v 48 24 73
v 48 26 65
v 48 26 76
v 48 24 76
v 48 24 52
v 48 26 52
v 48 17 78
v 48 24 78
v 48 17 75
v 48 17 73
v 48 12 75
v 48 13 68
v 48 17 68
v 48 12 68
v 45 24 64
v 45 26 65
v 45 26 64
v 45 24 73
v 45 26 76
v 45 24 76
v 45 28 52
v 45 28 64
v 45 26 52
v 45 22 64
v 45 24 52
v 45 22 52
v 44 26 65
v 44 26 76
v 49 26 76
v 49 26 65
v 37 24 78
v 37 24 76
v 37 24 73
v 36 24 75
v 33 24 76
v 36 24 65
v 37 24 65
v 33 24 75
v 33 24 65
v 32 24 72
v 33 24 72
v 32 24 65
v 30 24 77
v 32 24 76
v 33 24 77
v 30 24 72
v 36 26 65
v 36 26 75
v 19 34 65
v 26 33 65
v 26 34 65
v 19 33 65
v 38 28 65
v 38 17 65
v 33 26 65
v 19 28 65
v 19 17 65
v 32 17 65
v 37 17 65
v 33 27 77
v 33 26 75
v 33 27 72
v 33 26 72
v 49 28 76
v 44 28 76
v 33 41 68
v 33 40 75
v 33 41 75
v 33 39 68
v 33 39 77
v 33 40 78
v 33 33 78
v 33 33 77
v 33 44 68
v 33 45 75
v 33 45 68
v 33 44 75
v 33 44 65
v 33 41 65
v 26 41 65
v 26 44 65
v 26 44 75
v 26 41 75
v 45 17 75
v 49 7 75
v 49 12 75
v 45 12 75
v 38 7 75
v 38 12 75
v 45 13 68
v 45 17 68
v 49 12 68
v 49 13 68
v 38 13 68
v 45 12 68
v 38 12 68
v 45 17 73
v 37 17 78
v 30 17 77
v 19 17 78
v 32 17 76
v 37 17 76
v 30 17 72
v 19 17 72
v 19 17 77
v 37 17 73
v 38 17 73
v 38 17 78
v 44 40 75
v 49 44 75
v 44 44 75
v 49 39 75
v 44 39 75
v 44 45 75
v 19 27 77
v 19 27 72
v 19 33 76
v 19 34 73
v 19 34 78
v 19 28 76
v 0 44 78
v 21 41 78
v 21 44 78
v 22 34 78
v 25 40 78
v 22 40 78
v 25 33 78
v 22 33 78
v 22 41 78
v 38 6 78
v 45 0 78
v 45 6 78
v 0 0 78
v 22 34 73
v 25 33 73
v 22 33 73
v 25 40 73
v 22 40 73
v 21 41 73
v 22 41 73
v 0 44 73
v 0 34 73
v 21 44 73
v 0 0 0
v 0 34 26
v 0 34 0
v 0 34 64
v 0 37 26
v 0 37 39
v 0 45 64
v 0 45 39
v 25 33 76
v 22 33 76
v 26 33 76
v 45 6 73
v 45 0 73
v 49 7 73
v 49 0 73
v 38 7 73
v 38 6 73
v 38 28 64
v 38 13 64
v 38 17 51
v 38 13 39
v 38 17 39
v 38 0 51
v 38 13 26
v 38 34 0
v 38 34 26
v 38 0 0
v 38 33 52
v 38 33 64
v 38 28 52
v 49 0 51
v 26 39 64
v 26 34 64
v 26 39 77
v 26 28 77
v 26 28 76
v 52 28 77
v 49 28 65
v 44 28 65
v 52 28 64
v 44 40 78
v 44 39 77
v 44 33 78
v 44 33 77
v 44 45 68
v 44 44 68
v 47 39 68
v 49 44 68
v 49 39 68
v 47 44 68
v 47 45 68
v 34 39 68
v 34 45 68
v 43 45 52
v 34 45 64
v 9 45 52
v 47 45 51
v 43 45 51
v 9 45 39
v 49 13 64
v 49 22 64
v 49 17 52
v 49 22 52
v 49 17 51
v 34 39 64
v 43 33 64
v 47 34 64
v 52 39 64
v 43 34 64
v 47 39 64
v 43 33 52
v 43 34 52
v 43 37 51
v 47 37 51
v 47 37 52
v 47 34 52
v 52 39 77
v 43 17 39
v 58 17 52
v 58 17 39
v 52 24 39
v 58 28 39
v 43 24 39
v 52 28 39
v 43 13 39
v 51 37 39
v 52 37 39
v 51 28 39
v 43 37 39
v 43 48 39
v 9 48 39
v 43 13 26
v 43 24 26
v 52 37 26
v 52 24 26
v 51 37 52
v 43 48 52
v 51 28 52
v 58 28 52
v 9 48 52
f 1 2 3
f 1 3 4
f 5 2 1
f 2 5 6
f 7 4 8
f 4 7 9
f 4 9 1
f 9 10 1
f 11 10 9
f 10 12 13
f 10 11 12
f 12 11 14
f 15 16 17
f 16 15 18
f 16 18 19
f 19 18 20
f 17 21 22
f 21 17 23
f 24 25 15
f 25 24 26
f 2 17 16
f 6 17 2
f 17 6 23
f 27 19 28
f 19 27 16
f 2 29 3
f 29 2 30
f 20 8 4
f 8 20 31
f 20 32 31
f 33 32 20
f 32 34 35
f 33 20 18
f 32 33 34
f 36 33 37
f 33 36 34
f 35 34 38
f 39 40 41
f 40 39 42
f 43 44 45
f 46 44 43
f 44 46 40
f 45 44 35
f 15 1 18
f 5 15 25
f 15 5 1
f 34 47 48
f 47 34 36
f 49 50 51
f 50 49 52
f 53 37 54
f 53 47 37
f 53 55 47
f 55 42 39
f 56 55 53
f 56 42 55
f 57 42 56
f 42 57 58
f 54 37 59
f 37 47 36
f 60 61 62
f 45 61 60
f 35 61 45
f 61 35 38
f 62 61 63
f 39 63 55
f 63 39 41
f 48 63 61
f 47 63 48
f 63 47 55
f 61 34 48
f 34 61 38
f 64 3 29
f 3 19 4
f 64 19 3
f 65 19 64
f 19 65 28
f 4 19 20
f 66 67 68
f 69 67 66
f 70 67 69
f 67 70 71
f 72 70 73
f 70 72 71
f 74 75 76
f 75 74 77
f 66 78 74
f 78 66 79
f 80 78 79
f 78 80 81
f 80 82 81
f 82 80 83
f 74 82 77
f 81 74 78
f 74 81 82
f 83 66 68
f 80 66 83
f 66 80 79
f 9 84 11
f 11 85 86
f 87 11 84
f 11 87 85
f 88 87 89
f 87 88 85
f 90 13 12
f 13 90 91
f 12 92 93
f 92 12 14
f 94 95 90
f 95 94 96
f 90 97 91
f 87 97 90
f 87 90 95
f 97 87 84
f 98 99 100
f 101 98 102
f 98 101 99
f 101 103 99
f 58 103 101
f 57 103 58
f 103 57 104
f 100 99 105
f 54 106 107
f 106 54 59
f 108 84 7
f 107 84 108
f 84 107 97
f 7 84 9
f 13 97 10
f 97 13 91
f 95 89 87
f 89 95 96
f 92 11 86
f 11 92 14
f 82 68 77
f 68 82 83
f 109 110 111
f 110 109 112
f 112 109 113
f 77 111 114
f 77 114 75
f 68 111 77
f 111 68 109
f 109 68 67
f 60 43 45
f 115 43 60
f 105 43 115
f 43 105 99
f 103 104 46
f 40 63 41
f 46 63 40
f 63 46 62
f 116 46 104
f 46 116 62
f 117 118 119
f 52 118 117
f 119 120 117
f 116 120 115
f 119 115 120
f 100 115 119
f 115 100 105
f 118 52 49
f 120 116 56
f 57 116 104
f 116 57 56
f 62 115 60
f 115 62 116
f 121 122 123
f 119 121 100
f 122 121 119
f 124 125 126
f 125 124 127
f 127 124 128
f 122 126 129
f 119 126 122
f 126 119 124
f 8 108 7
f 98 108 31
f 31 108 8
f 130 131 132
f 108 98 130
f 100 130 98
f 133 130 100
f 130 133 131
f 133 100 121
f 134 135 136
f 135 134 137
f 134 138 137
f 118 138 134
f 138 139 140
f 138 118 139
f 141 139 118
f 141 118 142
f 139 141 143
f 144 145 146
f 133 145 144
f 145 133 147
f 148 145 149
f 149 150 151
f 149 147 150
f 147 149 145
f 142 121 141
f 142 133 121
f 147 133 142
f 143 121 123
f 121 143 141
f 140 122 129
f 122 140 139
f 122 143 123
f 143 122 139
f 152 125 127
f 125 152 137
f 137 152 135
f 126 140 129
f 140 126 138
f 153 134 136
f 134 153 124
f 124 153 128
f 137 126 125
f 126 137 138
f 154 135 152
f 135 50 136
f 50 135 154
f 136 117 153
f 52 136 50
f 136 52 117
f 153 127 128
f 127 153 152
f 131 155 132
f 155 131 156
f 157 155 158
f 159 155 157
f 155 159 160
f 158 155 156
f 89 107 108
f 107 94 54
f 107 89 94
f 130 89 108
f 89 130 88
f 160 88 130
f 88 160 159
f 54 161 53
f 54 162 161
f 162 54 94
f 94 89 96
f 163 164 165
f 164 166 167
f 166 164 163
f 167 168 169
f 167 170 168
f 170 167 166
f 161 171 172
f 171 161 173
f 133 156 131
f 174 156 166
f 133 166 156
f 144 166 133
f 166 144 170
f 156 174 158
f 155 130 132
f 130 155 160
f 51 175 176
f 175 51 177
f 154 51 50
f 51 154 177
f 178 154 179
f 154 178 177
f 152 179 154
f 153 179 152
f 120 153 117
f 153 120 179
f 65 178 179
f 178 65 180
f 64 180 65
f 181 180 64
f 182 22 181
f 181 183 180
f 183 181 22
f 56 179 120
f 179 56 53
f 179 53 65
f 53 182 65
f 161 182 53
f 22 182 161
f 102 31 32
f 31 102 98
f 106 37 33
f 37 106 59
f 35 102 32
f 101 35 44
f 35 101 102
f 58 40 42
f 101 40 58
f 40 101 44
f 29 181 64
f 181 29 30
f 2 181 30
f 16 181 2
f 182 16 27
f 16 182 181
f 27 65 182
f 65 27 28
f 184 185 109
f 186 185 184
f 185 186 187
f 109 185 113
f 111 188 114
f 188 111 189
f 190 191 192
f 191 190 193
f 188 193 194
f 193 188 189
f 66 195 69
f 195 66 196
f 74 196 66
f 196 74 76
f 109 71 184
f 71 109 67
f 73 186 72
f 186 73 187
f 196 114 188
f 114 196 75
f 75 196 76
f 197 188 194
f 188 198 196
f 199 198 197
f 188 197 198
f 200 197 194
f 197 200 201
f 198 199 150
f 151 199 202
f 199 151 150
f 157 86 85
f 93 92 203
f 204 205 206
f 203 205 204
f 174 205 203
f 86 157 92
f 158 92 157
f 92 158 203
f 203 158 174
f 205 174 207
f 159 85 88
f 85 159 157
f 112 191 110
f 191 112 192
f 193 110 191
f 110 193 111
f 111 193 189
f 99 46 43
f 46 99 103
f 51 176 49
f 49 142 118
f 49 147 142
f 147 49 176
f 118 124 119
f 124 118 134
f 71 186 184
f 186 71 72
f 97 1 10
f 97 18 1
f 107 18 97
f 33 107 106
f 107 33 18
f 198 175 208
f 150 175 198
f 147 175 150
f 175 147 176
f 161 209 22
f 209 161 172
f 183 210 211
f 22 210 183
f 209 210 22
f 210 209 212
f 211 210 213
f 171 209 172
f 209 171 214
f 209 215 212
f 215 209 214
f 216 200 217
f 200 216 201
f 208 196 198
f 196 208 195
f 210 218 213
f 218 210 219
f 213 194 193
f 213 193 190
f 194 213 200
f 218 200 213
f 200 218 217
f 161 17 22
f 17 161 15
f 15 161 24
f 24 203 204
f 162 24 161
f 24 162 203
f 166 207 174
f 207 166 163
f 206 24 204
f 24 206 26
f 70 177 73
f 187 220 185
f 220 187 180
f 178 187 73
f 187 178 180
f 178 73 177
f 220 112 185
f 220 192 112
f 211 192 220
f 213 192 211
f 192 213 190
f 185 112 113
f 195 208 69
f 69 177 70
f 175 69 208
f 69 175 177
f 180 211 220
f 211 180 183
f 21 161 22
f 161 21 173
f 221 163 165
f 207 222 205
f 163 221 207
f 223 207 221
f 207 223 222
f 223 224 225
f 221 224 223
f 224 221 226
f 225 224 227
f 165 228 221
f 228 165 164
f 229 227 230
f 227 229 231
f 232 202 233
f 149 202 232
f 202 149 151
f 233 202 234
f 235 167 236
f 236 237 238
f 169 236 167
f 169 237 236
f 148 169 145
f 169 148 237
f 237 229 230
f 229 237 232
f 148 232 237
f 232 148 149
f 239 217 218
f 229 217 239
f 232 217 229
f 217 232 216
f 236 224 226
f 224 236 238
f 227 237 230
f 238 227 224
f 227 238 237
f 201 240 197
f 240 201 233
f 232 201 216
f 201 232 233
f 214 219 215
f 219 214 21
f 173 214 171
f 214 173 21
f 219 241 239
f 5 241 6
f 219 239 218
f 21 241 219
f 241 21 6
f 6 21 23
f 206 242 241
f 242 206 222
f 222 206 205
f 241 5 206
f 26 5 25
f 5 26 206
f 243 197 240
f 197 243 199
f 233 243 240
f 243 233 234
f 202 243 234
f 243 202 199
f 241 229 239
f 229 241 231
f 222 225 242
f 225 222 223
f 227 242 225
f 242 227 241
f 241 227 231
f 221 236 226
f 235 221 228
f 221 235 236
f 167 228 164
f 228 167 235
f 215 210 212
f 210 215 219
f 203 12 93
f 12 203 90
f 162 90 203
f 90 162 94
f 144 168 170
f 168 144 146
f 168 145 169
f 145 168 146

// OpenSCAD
translate([46.5, 25.0, 53.5]) color([0.18514161515939986, 0.7580746928341441, 0.4199819570625165]) cube([3, 2, 5], center=true);
translate([46.5, 25.0, 58.5]) color([0.5731405723704375, 0.23673356878784502, 0.7138158488992904]) cube([3, 2, 5], center=true);
translate([46.5, 25.0, 63.5]) color([0.8637627475626694, 0.8949592620642776, 0.8103115760161889]) cube([3, 2, 5], center=true);
translate([34.5, 25.0, 67.5]) color([0.1004216369837837, 0.18827941391234093, 0.44049583318501173]) cube([3, 2, 5], center=true);
translate([46.5, 25.0, 68.5]) color([0.06522983258952386, 0.42674703623912436, 0.3947422574489625]) cube([3, 2, 5], center=true);
translate([34.5, 25.0, 72.5]) color([0.27185274848852736, 0.43721657158275895, 0.7577296702077931]) cube([3, 2, 5], center=true);
translate([46.5, 25.0, 73.5]) color([0.3561631337530091, 0.3277620307403001, 0.30701912216942273]) cube([3, 2, 5], center=true);
translate([29.5, 42.5, 67.5]) color([0.492518074892234, 0.7625268269371841, 0.2027877178963453]) cube([7, 3, 5], center=true);
translate([46.5, 14.5, 71.5]) color([0.39789846082497404, 0.4356119392473006, 0.6353731723550147]) cube([3, 5, 7], center=true);
translate([29.5, 42.5, 72.5]) color([0.673076446274384, 0.6970991483341651, 0.8225488218547198]) cube([7, 3, 5], center=true);
translate([22.5, 25.5, 74.5]) color([0.5826892216899469, 0.3545830833155835, 0.5687886411459258]) cube([7, 3, 5], center=true);
translate([29.5, 25.5, 74.5]) color([0.564415288794693, 0.2783497745403337, 0.8220051901362931]) cube([7, 3, 5], center=true);
translate([3.5, 42.5, 75.5]) color([0.39809270556066123, 0.9209203386432881, 0.13533998311747797]) cube([7, 3, 5], center=true);
translate([10.5, 42.5, 75.5]) color([0.08148203466772541, 0.8649487446802395, 0.36102136972914045]) cube([7, 3, 5], center=true);
translate([17.5, 42.5, 75.5]) color([0.06937329613248533, 0.7172877126247486, 0.671396341477498]) cube([7, 3, 5], center=true);
translate([23.5, 36.5, 75.5]) color([0.47110224547326685, 0.3145322421799046, 0.8413649413366762]) cube([3, 7, 5], center=true);
translate([41.5, 1.5, 75.5]) color([0.9545082818366412, 0.02538948740661906, 0.39264862168779513]) cube([7, 3, 5], center=true);
translate([41.5, 4.5, 75.5]) color([0.12527064222330164, 0.9928151500577586, 0.6355716010561779]) cube([7, 3, 5], center=true);
translate([22.5, 30.5, 70.5]) color([0.40641678624517696, 0.1421319514189895, 0.14748951348813844]) cube([7, 5, 11], center=true);
translate([34.5, 20.5, 70.5]) color([0.8666090764559645, 0.5114920143771782, 0.16291179601388028]) cube([5, 7, 11], center=true);
translate([46.5, 29.5, 70.5]) color([0.8928293074217152, 0.9106207302279238, 0.7053130391381187]) cube([5, 7, 11], center=true);
translate([38.5, 36.5, 70.5]) color([0.7162737307255599, 0.7235742512845528, 0.7298089625221481]) cube([11, 7, 5], center=true);
translate([38.5, 42.5, 71.5]) color([0.5196081403156461, 0.823493134639761, 0.6911885197769689]) cube([11, 5, 7], center=true);
translate([43.5, 3.5, 70.5]) color([0.6973164426626367, 0.38726457915960755, 0.18022138882203653]) cube([11, 7, 5], center=true);
translate([43.5, 9.5, 71.5]) color([0.8001465394041192, 0.8129994204848935, 0.08072942167368968]) cube([11, 5, 7], center=true);
translate([46.5, 38.5, 71.5]) color([0.17442535469903642, 0.26558344961408153, 0.8002006207478382]) cube([5, 11, 7], center=true);
translate([24.5, 20.5, 74.5]) color([0.3279381595582189, 0.7086727191051987, 0.7823295314553788]) cube([11, 7, 5], center=true);
translate([5.5, 37.5, 75.5]) color([0.5174360046946651, 0.45647885649310815, 0.9099967640280606]) cube([11, 7, 5], center=true);
translate([16.5, 37.5, 75.5]) color([0.7566722996545016, 0.44882496858184395, 0.15281911968142636]) cube([11, 7, 5], center=true);
translate([38.5, 36.5, 75.5]) color([0.6325441046469116, 0.1769660088535372, 0.5122224095001495]) cube([11, 7, 5], center=true);
translate([42.5, 20.5, 75.5]) color([0.8959696721858674, 0.31608020378500323, 0.9467436825606468]) cube([11, 7, 5], center=true);
translate([26.5, 36.5, 57.5]) color([0.1928870204716916, 0.7910187054913302, 0.6108926701450443]) cube([11, 7, 13], center=true);
translate([37.5, 36.5, 57.5]) color([0.8122678209742187, 0.5222627979471512, 0.7095307583634994]) cube([11, 7, 13], center=true);
translate([27.5, 42.5, 57.5]) color([0.9126687247694082, 0.13487625477079712, 0.7715208720856912]) cube([13, 5, 13], center=true);
translate([40.5, 42.5, 57.5]) color([0.05716454642595936, 0.08241654053773162, 0.5176706786705761]) cube([13, 5, 13], center=true);
translate([43.5, 5.5, 57.5]) color([0.0024604932439482585, 0.774865046739482, 0.10398133417765076]) cube([11, 11, 13], center=true);
translate([43.5, 16.5, 57.5]) color([0.6075408633971222, 0.5702741924791085, 0.335807396721168]) cube([11, 11, 13], center=true);
translate([32.5, 33.5, 70.5]) color([0.3780654483467295, 0.36205489178930694, 0.8413126085807436]) cube([13, 11, 13], center=true);
translate([45.5, 33.5, 70.5]) color([0.6365683683667089, 0.13610848275491239, 0.9255182446742467]) cube([13, 11, 13], center=true);
translate([25.5, 22.5, 57.5]) color([0.18259927432055334, 0.12509989752770068, 0.33788945440902196]) cube([13, 11, 13], center=true);
translate([38.5, 22.5, 57.5]) color([0.607477949510089, 0.04413950751599882, 0.6453929548117466]) cube([13, 11, 13], center=true);
translate([6.5, 39.5, 57.5]) color([0.6988419541065013, 0.7967664255910738, 0.9116718921976609]) cube([13, 11, 13], center=true);
translate([19.5, 39.5, 57.5]) color([0.600448770579328, 0.7944487907838055, 0.1681613799771936]) cube([13, 11, 13], center=true);
translate([6.5, 30.5, 32.5]) color([0.9183995562433641, 0.9268586566852167, 0.40822611044352053]) cube([13, 13, 13], center=true);
translate([19.5, 30.5, 32.5]) color([0.4407066729290805, 0.6041418306666712, 0.6201352905963935]) cube([13, 13, 13], center=true);
translate([32.5, 30.5, 32.5]) color([0.25582819932935885, 0.3097428572381714, 0.8490920052212889]) cube([13, 13, 13], center=true);
translate([45.5, 30.5, 32.5]) color([0.453637908490201, 0.18066627555108494, 0.4537290543496928]) cube([13, 13, 13], center=true);
translate([34.5, 42.5, 45.5]) color([0.2641493990309046, 0.9492851375614021, 0.06409274308092405]) cube([17, 11, 13], center=true);
translate([17.5, 42.5, 45.5]) color([0.09630522223834415, 0.02618666999626429, 0.02133712304448243]) cube([17, 11, 13], center=true);
translate([8.5, 30.5, 45.5]) color([0.40376331371079255, 0.6905719463038024, 0.8969992176715027]) cube([17, 13, 13], center=true);
translate([25.5, 30.5, 45.5]) color([0.32280326974746465, 0.790755737975632, 0.7460115169857665]) cube([17, 13, 13], center=true);
translate([42.5, 30.5, 45.5]) color([0.6948475129606672, 0.47653257906772517, 0.8579766307154586]) cube([17, 13, 13], center=true);
translate([38.5, 22.5, 45.5]) color([0.5356136848189613, 0.4019331618452773, 0.783713898498177]) cube([13, 11, 13], center=true);
translate([51.5, 22.5, 45.5]) color([0.9254696984756191, 0.0277966234683793, 0.5158650286176655]) cube([13, 11, 13], center=true);
translate([17.5, 18.5, 32.5]) color([0.8365998776746773, 0.08009244005093674, 0.35854963179787425]) cube([17, 11, 13], center=true);
translate([34.5, 18.5, 32.5]) color([0.0984859129144442, 0.9681463616569913, 0.1542718478221884]) cube([17, 11, 13], center=true);
translate([8.5, 39.5, 45.5]) color([0.5165971564168642, 0.8047430089643692, 0.9598305824160865]) cube([17, 11, 13], center=true);
translate([25.5, 39.5, 45.5]) color([0.0007265089205383823, 0.33769105491683293, 0.9444140087685011]) cube([17, 11, 13], center=true);
translate([40.5, 39.5, 59.5]) color([0.6959768172121321, 0.16055826227824588, 0.7793255516951493]) cube([13, 11, 17], center=true);
translate([43.5, 6.5, 59.5]) color([0.1589752259859445, 0.6798370424105331, 0.9431536263145228]) cube([11, 13, 17], center=true);
translate([9.5, 8.5, 6.5]) color([0.9341404857092784, 0.32827049453258017, 0.023848105094706917]) cube([19, 17, 13], center=true);
translate([9.5, 25.5, 6.5]) color([0.9585798448912861, 0.6258377632382796, 0.3981042954636257]) cube([19, 17, 13], center=true);
translate([28.5, 8.5, 6.5]) color([0.2264255750200933, 0.6356717667101055, 0.328569085672622]) cube([19, 17, 13], center=true);
translate([28.5, 25.5, 6.5]) color([0.9662245753272395, 0.3520821722301851, 0.16362135021644642]) cube([19, 17, 13], center=true);
translate([9.5, 8.5, 19.5]) color([0.42074777530803376, 0.36328644213461747, 0.5653807754665455]) cube([19, 17, 13], center=true);
translate([9.5, 25.5, 19.5]) color([0.3865100485452896, 0.7707594112565195, 0.16214085318372695]) cube([19, 17, 13], center=true);
translate([28.5, 8.5, 19.5]) color([0.5836514905515098, 0.6869400768720183, 0.718467099976435]) cube([19, 17, 13], center=true);
translate([28.5, 25.5, 19.5]) color([0.17196229100139104, 0.14887881293527583, 0.025166107893626943]) cube([19, 17, 13], center=true);
translate([9.5, 8.5, 32.5]) color([0.32332346968418324, 0.003696799562737496, 0.04720529747843194]) cube([19, 17, 13], center=true);
translate([9.5, 25.5, 32.5]) color([0.9255571895234466, 0.573001262631075, 0.14769469781462263]) cube([19, 17, 13], center=true);
translate([28.5, 8.5, 32.5]) color([0.15315209085934545, 0.7868491215994531, 0.7877029182496789]) cube([19, 17, 13], center=true);
translate([28.5, 25.5, 32.5]) color([0.4187372508366701, 0.5680438273675328, 0.6864311496386182]) cube([19, 17, 13], center=true);
translate([9.5, 8.5, 45.5]) color([0.7112052310106062, 0.9225367392437966, 0.36402675889620517]) cube([19, 17, 13], center=true);
translate([9.5, 25.5, 45.5]) color([0.21666285047939615, 0.40038769746607716, 0.12979762559949215]) cube([19, 17, 13], center=true);
translate([28.5, 8.5, 45.5]) color([0.5661089096865166, 0.350592866287013, 0.09655676358596321]) cube([19, 17, 13], center=true);
translate([28.5, 25.5, 45.5]) color([0.8957043173613797, 0.24564542972396286, 0.3817592950540295]) cube([19, 17, 13], center=true);
translate([9.5, 8.5, 58.5]) color([0.9163373365613642, 0.24005472395766314, 0.4811830401201487]) cube([19, 17, 13], center=true);
translate([9.5, 25.5, 58.5]) color([0.9204180358452778, 0.06901768472479497, 0.25236871091997304]) cube([19, 17, 13], center=true);
translate([28.5, 8.5, 58.5]) color([0.2758752397078251, 0.526585946767007, 0.5423400552699501]) cube([19, 17, 13], center=true);
translate([28.5, 25.5, 58.5]) color([0.6040332809955223, 0.7795947303962014, 0.8767515811101877]) cube([19, 17, 13], center=true);
translate([9.5, 8.5, 71.5]) color([0.27628184885013174, 0.6109665581700968, 0.8673330381368943]) cube([19, 17, 13], center=true);
translate([9.5, 25.5, 71.5]) color([0.39077563557117434, 0.6261021875341246, 0.5344719952169016]) cube([19, 17, 13], center=true);
translate([28.5, 8.5, 71.5]) color([0.8525626141482417, 0.1442072370162294, 0.39242938925918713]) cube([19, 17, 13], center=true);
